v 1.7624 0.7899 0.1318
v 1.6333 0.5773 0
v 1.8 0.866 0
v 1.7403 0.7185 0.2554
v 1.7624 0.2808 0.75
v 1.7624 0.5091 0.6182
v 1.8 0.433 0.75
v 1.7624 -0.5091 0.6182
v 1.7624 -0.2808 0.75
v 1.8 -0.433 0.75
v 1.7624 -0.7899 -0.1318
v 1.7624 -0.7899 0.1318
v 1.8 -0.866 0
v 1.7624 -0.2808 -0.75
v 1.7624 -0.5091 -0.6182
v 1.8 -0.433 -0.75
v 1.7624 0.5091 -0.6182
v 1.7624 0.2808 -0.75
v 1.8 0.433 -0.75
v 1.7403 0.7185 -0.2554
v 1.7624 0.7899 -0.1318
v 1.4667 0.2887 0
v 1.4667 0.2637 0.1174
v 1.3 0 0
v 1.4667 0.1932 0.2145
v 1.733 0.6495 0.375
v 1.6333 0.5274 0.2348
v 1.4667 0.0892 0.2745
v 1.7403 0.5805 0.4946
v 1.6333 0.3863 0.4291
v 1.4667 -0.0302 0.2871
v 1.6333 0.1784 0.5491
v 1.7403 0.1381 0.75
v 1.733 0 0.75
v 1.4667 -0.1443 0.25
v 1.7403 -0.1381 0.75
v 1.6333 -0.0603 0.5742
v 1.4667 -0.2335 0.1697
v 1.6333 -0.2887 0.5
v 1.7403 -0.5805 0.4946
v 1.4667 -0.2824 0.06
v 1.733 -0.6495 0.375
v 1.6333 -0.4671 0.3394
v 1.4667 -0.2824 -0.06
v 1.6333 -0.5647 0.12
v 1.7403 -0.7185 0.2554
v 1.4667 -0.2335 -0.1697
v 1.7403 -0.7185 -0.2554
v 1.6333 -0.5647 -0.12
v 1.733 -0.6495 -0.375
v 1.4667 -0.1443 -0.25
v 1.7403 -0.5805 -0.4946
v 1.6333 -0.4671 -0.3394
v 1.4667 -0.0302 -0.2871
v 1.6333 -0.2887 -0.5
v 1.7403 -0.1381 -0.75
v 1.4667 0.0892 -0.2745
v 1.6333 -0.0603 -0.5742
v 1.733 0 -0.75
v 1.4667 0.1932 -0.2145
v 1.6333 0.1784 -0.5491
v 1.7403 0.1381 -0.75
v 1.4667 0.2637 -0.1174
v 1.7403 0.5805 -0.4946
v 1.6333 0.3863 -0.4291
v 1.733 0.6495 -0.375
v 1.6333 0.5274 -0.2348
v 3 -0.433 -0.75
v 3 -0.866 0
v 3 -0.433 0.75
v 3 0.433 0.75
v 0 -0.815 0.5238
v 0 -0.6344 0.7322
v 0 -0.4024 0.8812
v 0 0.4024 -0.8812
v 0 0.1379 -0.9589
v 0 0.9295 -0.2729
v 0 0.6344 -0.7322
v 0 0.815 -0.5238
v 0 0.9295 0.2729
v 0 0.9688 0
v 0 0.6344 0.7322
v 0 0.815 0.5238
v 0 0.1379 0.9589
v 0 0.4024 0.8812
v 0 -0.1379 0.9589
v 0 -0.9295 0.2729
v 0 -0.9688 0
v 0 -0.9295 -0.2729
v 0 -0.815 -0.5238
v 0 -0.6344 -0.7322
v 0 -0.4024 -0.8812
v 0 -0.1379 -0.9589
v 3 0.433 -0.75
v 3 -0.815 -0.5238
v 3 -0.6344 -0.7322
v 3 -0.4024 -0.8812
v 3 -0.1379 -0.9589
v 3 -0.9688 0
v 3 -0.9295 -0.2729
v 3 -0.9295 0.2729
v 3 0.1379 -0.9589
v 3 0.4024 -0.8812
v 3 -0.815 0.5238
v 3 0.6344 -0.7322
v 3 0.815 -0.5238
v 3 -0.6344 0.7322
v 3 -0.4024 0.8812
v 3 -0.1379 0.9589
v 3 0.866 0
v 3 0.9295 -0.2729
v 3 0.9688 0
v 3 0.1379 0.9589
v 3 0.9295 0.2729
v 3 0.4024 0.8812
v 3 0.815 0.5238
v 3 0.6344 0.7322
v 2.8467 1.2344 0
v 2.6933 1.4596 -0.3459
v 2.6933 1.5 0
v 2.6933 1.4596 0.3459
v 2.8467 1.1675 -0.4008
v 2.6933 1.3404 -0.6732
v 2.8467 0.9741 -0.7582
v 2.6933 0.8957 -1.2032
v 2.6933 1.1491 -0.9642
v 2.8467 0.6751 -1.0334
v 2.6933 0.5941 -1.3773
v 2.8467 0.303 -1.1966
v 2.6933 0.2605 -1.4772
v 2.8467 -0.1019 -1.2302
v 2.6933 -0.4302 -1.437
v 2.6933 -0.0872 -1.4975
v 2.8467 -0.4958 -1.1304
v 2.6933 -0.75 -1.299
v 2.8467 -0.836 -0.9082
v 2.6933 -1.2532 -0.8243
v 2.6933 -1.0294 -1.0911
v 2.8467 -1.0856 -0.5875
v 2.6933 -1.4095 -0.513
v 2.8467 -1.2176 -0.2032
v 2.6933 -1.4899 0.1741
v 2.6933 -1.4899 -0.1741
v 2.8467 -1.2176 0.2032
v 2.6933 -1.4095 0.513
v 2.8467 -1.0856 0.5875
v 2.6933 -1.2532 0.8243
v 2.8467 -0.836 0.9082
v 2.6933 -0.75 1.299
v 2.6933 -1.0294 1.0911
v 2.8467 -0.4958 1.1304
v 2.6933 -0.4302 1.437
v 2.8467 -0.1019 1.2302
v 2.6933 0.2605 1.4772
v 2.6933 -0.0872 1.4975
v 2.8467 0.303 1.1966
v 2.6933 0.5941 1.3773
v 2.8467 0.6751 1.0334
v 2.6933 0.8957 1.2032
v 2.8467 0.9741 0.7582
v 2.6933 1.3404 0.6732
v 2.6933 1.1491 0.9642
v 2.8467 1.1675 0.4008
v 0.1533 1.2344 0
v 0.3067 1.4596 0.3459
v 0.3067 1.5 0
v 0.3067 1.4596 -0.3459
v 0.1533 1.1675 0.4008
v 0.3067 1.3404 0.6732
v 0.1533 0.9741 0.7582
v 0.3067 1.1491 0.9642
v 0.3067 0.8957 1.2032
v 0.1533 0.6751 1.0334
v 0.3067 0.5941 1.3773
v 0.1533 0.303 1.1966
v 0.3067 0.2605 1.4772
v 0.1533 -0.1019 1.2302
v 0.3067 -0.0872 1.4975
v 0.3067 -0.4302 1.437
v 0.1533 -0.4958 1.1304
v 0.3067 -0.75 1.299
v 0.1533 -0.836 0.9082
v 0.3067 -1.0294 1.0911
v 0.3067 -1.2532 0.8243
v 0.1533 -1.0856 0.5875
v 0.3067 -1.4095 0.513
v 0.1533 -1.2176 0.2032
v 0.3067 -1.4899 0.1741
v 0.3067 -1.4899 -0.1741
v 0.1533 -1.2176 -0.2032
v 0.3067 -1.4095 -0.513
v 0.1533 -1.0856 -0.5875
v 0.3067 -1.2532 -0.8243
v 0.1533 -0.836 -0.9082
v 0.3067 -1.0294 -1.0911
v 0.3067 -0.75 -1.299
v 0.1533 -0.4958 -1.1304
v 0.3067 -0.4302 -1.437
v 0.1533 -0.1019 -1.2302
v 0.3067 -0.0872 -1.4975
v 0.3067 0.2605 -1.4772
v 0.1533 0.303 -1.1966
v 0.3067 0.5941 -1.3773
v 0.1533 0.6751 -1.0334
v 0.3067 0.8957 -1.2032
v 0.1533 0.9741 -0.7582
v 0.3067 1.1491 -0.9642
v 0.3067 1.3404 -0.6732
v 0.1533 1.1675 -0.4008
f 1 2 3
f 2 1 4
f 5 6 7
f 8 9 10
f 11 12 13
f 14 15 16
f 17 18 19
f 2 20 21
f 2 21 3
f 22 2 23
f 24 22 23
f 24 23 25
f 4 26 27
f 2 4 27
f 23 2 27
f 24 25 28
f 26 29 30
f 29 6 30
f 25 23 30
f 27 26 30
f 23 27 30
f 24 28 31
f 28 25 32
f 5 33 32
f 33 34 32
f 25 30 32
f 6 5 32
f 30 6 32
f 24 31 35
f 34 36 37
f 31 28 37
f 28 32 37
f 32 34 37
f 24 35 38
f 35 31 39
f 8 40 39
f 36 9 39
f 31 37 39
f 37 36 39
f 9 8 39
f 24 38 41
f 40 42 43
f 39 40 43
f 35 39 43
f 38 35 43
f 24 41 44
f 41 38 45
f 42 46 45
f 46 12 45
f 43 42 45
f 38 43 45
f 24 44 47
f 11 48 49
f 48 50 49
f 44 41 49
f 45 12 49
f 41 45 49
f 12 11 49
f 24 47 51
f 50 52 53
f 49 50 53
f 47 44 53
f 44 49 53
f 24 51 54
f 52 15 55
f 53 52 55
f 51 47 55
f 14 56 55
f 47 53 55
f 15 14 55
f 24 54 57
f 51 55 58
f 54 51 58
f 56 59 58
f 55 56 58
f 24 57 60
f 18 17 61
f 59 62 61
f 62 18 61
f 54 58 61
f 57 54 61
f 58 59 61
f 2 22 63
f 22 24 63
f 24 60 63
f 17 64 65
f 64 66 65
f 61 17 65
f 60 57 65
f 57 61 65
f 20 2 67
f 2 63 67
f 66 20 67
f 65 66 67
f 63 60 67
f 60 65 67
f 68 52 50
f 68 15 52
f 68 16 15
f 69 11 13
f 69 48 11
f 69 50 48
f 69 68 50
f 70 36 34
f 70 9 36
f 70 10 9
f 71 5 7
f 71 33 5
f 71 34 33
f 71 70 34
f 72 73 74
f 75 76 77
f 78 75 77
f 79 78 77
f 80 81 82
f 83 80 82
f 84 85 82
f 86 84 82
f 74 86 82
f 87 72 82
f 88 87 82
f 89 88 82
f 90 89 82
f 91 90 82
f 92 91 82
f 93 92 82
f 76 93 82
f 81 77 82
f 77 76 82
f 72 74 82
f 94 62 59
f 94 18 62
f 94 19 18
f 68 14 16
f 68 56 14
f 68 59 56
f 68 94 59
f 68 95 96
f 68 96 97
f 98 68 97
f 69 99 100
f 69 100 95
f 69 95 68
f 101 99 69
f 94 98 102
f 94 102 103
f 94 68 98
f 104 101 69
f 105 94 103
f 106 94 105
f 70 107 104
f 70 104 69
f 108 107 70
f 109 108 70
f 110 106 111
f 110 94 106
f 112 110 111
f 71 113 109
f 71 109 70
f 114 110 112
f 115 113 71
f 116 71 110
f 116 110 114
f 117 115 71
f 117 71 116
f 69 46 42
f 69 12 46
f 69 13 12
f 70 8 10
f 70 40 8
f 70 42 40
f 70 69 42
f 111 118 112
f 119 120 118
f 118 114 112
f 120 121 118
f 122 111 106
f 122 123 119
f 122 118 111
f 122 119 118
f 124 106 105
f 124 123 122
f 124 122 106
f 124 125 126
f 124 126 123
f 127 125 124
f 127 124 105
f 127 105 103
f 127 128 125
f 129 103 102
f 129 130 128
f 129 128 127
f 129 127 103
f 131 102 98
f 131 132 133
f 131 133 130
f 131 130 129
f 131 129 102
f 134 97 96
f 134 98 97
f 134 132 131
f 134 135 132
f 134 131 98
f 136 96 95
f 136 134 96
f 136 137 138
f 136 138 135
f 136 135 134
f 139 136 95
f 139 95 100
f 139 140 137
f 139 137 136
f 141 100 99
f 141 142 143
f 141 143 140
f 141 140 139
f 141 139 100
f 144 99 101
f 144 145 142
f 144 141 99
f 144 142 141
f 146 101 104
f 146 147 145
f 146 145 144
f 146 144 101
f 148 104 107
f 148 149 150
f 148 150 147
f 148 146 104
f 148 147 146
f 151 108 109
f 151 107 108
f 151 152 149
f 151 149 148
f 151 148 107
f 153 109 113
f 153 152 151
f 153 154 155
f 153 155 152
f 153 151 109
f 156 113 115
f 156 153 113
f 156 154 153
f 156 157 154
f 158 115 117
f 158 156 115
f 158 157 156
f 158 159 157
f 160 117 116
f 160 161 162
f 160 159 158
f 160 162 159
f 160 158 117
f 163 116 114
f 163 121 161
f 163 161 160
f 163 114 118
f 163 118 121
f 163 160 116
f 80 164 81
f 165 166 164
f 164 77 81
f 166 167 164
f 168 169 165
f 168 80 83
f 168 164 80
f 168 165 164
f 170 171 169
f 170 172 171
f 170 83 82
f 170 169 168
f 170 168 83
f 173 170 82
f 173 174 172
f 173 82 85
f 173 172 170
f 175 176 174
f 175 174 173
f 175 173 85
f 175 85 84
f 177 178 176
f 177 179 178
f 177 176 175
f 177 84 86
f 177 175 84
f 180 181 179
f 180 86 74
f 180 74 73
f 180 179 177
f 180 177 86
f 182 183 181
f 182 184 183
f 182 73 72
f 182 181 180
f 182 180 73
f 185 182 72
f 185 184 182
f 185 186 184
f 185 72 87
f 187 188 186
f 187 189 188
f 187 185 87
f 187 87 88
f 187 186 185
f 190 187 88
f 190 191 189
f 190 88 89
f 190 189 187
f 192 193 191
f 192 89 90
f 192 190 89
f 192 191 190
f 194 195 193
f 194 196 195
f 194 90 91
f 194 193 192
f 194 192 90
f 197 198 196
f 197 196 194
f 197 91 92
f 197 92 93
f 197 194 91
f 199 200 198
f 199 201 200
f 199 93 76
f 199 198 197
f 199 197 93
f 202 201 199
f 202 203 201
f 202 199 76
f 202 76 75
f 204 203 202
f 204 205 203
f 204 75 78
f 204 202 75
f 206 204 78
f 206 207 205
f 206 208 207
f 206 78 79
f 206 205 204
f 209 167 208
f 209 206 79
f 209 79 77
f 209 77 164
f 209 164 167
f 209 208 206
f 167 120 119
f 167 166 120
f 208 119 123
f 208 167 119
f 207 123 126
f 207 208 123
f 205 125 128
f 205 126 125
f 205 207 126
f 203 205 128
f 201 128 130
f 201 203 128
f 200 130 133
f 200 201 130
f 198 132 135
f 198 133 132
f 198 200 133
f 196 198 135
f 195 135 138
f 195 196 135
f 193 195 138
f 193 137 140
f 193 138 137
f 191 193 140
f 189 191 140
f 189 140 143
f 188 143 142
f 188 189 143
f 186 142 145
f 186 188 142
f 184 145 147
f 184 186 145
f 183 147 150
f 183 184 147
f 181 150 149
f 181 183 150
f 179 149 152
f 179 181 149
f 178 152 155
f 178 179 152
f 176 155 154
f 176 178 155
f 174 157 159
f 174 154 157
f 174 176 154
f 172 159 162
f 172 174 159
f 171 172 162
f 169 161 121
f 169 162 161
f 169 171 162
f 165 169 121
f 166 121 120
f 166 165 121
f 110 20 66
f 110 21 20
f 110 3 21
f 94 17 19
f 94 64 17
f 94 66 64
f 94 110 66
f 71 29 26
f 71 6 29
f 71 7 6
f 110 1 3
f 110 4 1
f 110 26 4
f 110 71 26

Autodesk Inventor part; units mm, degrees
ref_plane "YZ Plane" through (0, 0, 0) normal (1, 0, 0) x (0, 1, 0)
ref_plane "XZ Plane" through (0, 0, 0) normal (0, 1, 0) x (-1, 0, 0)
sketch "Skizze1" plane through (0, 0, 0) normal (0, 0, 1) x (1, 0, 0)
  line L0 (0, 0) -> (1.3, 0)
  line L1 (3, 0.866) -> (3, 1.5)
  line L2 (3, 1.5) -> (0, 1.5)
  line L3 (3, 0.866) -> (1.8, 0.866)
  line L4 (1.8, 0.866) -> (1.3, 0)
  line L5 (0, -0.3) -> (0, 1.8) projected
  line L6 (0, 1.5) -> (0, 0)
  dimension "d0" = 1.2
  dimension "d1" = 60
  dimension "d2" = 3
  dimension "d3" = 1.7321
  dimension "d5" = 3
revolve "Körper" add sketch "Skizze1" angle 360 about axis through (0, 0, 0) along (1, 0, 0)
sketch "Skizze2" plane through (3, 0, 0) normal (1, 0, 0) x (0, 1, 0)
  circle A0 centre (0, 0) radius 0.866 projected
  line L0 (-0.433, 0.75) -> (0.433, 0.75)
  line L1 (0.433, 0.75) -> (0.866, 0)
  line L2 (0.866, 0) -> (0.433, -0.75)
  line L3 (0.433, -0.75) -> (-0.433, -0.75)
  line L4 (-0.433, -0.75) -> (-0.866, 0)
  line L5 (-0.866, 0) -> (-0.433, 0.75)
  point P0 (0, 0)
  point P1 (0, 0)
extrude "Loch" add sketch "Skizze2" against normal up to next contours L1 A0 | A0 L2 | L0 A0 | A0 L3 | L5 A0 | A0 L4
thread "Gewinde" size "M3x0.5" class "6g" standard "ISO Metric profile" length 3
chamfer "Fase1" distance 0.3067 angle 60 1 edges at (3, -1.5, 0) measured on face at (2, 1.4806, -0.2406)
chamfer "Fase2" distance 0.3067 angle 60 1 edges at (0, -1.5, 0) measured on face at (0.8978, 1.4951, -0.1207)
ref_plane "Work Plane1" through (1.5, 0, 0) normal (0, 0, 1) x (1, 0, 0)
equation "\"d0\" = INTI"
equation "\"d2\" = NND"
equation "\"d3\" = 1.1547 * SW"
equation "\"d5\" = NLG"
equation "\"d8\" = NLG"
equation "\"d10\" = -0.5 * GD1 + 0.5 * NND"
equation "\"d11\" = FAWI"
equation "\"d34\" = -0.5 * GD1 + 0.5 * NND"
equation "\"d12\" = -0.5 * GD1 + 0.5 * NND"
equation "\"d13\" = FAWI"
equation "\"d35\" = -0.5 * GD1 + 0.5 * NND"
equation "\"NND\" = 3"
equation "\"NLG\" = 3"
equation "\"INTI\" = 1.2"
equation "\"FAWI\" = 60deg"
equation "\"SW\" = 1.5"
equation "\"GD1\" = THREADDIA - 1.2269 * PTC"
equation "\"SPD\" = 2"
equation "\"GUL\" = 0.61345 * PTC"
equation "\"TOA\" = 30deg"
equation "\"THREADDIA\" = 3"
equation "\"PTC\" = 0.5"
equation "\"FAWI1\" = 45deg"
equation "\"GAL\" = 0.61345 * PTC"
equation "\"E0\" = 1.155 * SW"
properties part number "DIN 913 - M3 x 3" material "Stahl, weich"
